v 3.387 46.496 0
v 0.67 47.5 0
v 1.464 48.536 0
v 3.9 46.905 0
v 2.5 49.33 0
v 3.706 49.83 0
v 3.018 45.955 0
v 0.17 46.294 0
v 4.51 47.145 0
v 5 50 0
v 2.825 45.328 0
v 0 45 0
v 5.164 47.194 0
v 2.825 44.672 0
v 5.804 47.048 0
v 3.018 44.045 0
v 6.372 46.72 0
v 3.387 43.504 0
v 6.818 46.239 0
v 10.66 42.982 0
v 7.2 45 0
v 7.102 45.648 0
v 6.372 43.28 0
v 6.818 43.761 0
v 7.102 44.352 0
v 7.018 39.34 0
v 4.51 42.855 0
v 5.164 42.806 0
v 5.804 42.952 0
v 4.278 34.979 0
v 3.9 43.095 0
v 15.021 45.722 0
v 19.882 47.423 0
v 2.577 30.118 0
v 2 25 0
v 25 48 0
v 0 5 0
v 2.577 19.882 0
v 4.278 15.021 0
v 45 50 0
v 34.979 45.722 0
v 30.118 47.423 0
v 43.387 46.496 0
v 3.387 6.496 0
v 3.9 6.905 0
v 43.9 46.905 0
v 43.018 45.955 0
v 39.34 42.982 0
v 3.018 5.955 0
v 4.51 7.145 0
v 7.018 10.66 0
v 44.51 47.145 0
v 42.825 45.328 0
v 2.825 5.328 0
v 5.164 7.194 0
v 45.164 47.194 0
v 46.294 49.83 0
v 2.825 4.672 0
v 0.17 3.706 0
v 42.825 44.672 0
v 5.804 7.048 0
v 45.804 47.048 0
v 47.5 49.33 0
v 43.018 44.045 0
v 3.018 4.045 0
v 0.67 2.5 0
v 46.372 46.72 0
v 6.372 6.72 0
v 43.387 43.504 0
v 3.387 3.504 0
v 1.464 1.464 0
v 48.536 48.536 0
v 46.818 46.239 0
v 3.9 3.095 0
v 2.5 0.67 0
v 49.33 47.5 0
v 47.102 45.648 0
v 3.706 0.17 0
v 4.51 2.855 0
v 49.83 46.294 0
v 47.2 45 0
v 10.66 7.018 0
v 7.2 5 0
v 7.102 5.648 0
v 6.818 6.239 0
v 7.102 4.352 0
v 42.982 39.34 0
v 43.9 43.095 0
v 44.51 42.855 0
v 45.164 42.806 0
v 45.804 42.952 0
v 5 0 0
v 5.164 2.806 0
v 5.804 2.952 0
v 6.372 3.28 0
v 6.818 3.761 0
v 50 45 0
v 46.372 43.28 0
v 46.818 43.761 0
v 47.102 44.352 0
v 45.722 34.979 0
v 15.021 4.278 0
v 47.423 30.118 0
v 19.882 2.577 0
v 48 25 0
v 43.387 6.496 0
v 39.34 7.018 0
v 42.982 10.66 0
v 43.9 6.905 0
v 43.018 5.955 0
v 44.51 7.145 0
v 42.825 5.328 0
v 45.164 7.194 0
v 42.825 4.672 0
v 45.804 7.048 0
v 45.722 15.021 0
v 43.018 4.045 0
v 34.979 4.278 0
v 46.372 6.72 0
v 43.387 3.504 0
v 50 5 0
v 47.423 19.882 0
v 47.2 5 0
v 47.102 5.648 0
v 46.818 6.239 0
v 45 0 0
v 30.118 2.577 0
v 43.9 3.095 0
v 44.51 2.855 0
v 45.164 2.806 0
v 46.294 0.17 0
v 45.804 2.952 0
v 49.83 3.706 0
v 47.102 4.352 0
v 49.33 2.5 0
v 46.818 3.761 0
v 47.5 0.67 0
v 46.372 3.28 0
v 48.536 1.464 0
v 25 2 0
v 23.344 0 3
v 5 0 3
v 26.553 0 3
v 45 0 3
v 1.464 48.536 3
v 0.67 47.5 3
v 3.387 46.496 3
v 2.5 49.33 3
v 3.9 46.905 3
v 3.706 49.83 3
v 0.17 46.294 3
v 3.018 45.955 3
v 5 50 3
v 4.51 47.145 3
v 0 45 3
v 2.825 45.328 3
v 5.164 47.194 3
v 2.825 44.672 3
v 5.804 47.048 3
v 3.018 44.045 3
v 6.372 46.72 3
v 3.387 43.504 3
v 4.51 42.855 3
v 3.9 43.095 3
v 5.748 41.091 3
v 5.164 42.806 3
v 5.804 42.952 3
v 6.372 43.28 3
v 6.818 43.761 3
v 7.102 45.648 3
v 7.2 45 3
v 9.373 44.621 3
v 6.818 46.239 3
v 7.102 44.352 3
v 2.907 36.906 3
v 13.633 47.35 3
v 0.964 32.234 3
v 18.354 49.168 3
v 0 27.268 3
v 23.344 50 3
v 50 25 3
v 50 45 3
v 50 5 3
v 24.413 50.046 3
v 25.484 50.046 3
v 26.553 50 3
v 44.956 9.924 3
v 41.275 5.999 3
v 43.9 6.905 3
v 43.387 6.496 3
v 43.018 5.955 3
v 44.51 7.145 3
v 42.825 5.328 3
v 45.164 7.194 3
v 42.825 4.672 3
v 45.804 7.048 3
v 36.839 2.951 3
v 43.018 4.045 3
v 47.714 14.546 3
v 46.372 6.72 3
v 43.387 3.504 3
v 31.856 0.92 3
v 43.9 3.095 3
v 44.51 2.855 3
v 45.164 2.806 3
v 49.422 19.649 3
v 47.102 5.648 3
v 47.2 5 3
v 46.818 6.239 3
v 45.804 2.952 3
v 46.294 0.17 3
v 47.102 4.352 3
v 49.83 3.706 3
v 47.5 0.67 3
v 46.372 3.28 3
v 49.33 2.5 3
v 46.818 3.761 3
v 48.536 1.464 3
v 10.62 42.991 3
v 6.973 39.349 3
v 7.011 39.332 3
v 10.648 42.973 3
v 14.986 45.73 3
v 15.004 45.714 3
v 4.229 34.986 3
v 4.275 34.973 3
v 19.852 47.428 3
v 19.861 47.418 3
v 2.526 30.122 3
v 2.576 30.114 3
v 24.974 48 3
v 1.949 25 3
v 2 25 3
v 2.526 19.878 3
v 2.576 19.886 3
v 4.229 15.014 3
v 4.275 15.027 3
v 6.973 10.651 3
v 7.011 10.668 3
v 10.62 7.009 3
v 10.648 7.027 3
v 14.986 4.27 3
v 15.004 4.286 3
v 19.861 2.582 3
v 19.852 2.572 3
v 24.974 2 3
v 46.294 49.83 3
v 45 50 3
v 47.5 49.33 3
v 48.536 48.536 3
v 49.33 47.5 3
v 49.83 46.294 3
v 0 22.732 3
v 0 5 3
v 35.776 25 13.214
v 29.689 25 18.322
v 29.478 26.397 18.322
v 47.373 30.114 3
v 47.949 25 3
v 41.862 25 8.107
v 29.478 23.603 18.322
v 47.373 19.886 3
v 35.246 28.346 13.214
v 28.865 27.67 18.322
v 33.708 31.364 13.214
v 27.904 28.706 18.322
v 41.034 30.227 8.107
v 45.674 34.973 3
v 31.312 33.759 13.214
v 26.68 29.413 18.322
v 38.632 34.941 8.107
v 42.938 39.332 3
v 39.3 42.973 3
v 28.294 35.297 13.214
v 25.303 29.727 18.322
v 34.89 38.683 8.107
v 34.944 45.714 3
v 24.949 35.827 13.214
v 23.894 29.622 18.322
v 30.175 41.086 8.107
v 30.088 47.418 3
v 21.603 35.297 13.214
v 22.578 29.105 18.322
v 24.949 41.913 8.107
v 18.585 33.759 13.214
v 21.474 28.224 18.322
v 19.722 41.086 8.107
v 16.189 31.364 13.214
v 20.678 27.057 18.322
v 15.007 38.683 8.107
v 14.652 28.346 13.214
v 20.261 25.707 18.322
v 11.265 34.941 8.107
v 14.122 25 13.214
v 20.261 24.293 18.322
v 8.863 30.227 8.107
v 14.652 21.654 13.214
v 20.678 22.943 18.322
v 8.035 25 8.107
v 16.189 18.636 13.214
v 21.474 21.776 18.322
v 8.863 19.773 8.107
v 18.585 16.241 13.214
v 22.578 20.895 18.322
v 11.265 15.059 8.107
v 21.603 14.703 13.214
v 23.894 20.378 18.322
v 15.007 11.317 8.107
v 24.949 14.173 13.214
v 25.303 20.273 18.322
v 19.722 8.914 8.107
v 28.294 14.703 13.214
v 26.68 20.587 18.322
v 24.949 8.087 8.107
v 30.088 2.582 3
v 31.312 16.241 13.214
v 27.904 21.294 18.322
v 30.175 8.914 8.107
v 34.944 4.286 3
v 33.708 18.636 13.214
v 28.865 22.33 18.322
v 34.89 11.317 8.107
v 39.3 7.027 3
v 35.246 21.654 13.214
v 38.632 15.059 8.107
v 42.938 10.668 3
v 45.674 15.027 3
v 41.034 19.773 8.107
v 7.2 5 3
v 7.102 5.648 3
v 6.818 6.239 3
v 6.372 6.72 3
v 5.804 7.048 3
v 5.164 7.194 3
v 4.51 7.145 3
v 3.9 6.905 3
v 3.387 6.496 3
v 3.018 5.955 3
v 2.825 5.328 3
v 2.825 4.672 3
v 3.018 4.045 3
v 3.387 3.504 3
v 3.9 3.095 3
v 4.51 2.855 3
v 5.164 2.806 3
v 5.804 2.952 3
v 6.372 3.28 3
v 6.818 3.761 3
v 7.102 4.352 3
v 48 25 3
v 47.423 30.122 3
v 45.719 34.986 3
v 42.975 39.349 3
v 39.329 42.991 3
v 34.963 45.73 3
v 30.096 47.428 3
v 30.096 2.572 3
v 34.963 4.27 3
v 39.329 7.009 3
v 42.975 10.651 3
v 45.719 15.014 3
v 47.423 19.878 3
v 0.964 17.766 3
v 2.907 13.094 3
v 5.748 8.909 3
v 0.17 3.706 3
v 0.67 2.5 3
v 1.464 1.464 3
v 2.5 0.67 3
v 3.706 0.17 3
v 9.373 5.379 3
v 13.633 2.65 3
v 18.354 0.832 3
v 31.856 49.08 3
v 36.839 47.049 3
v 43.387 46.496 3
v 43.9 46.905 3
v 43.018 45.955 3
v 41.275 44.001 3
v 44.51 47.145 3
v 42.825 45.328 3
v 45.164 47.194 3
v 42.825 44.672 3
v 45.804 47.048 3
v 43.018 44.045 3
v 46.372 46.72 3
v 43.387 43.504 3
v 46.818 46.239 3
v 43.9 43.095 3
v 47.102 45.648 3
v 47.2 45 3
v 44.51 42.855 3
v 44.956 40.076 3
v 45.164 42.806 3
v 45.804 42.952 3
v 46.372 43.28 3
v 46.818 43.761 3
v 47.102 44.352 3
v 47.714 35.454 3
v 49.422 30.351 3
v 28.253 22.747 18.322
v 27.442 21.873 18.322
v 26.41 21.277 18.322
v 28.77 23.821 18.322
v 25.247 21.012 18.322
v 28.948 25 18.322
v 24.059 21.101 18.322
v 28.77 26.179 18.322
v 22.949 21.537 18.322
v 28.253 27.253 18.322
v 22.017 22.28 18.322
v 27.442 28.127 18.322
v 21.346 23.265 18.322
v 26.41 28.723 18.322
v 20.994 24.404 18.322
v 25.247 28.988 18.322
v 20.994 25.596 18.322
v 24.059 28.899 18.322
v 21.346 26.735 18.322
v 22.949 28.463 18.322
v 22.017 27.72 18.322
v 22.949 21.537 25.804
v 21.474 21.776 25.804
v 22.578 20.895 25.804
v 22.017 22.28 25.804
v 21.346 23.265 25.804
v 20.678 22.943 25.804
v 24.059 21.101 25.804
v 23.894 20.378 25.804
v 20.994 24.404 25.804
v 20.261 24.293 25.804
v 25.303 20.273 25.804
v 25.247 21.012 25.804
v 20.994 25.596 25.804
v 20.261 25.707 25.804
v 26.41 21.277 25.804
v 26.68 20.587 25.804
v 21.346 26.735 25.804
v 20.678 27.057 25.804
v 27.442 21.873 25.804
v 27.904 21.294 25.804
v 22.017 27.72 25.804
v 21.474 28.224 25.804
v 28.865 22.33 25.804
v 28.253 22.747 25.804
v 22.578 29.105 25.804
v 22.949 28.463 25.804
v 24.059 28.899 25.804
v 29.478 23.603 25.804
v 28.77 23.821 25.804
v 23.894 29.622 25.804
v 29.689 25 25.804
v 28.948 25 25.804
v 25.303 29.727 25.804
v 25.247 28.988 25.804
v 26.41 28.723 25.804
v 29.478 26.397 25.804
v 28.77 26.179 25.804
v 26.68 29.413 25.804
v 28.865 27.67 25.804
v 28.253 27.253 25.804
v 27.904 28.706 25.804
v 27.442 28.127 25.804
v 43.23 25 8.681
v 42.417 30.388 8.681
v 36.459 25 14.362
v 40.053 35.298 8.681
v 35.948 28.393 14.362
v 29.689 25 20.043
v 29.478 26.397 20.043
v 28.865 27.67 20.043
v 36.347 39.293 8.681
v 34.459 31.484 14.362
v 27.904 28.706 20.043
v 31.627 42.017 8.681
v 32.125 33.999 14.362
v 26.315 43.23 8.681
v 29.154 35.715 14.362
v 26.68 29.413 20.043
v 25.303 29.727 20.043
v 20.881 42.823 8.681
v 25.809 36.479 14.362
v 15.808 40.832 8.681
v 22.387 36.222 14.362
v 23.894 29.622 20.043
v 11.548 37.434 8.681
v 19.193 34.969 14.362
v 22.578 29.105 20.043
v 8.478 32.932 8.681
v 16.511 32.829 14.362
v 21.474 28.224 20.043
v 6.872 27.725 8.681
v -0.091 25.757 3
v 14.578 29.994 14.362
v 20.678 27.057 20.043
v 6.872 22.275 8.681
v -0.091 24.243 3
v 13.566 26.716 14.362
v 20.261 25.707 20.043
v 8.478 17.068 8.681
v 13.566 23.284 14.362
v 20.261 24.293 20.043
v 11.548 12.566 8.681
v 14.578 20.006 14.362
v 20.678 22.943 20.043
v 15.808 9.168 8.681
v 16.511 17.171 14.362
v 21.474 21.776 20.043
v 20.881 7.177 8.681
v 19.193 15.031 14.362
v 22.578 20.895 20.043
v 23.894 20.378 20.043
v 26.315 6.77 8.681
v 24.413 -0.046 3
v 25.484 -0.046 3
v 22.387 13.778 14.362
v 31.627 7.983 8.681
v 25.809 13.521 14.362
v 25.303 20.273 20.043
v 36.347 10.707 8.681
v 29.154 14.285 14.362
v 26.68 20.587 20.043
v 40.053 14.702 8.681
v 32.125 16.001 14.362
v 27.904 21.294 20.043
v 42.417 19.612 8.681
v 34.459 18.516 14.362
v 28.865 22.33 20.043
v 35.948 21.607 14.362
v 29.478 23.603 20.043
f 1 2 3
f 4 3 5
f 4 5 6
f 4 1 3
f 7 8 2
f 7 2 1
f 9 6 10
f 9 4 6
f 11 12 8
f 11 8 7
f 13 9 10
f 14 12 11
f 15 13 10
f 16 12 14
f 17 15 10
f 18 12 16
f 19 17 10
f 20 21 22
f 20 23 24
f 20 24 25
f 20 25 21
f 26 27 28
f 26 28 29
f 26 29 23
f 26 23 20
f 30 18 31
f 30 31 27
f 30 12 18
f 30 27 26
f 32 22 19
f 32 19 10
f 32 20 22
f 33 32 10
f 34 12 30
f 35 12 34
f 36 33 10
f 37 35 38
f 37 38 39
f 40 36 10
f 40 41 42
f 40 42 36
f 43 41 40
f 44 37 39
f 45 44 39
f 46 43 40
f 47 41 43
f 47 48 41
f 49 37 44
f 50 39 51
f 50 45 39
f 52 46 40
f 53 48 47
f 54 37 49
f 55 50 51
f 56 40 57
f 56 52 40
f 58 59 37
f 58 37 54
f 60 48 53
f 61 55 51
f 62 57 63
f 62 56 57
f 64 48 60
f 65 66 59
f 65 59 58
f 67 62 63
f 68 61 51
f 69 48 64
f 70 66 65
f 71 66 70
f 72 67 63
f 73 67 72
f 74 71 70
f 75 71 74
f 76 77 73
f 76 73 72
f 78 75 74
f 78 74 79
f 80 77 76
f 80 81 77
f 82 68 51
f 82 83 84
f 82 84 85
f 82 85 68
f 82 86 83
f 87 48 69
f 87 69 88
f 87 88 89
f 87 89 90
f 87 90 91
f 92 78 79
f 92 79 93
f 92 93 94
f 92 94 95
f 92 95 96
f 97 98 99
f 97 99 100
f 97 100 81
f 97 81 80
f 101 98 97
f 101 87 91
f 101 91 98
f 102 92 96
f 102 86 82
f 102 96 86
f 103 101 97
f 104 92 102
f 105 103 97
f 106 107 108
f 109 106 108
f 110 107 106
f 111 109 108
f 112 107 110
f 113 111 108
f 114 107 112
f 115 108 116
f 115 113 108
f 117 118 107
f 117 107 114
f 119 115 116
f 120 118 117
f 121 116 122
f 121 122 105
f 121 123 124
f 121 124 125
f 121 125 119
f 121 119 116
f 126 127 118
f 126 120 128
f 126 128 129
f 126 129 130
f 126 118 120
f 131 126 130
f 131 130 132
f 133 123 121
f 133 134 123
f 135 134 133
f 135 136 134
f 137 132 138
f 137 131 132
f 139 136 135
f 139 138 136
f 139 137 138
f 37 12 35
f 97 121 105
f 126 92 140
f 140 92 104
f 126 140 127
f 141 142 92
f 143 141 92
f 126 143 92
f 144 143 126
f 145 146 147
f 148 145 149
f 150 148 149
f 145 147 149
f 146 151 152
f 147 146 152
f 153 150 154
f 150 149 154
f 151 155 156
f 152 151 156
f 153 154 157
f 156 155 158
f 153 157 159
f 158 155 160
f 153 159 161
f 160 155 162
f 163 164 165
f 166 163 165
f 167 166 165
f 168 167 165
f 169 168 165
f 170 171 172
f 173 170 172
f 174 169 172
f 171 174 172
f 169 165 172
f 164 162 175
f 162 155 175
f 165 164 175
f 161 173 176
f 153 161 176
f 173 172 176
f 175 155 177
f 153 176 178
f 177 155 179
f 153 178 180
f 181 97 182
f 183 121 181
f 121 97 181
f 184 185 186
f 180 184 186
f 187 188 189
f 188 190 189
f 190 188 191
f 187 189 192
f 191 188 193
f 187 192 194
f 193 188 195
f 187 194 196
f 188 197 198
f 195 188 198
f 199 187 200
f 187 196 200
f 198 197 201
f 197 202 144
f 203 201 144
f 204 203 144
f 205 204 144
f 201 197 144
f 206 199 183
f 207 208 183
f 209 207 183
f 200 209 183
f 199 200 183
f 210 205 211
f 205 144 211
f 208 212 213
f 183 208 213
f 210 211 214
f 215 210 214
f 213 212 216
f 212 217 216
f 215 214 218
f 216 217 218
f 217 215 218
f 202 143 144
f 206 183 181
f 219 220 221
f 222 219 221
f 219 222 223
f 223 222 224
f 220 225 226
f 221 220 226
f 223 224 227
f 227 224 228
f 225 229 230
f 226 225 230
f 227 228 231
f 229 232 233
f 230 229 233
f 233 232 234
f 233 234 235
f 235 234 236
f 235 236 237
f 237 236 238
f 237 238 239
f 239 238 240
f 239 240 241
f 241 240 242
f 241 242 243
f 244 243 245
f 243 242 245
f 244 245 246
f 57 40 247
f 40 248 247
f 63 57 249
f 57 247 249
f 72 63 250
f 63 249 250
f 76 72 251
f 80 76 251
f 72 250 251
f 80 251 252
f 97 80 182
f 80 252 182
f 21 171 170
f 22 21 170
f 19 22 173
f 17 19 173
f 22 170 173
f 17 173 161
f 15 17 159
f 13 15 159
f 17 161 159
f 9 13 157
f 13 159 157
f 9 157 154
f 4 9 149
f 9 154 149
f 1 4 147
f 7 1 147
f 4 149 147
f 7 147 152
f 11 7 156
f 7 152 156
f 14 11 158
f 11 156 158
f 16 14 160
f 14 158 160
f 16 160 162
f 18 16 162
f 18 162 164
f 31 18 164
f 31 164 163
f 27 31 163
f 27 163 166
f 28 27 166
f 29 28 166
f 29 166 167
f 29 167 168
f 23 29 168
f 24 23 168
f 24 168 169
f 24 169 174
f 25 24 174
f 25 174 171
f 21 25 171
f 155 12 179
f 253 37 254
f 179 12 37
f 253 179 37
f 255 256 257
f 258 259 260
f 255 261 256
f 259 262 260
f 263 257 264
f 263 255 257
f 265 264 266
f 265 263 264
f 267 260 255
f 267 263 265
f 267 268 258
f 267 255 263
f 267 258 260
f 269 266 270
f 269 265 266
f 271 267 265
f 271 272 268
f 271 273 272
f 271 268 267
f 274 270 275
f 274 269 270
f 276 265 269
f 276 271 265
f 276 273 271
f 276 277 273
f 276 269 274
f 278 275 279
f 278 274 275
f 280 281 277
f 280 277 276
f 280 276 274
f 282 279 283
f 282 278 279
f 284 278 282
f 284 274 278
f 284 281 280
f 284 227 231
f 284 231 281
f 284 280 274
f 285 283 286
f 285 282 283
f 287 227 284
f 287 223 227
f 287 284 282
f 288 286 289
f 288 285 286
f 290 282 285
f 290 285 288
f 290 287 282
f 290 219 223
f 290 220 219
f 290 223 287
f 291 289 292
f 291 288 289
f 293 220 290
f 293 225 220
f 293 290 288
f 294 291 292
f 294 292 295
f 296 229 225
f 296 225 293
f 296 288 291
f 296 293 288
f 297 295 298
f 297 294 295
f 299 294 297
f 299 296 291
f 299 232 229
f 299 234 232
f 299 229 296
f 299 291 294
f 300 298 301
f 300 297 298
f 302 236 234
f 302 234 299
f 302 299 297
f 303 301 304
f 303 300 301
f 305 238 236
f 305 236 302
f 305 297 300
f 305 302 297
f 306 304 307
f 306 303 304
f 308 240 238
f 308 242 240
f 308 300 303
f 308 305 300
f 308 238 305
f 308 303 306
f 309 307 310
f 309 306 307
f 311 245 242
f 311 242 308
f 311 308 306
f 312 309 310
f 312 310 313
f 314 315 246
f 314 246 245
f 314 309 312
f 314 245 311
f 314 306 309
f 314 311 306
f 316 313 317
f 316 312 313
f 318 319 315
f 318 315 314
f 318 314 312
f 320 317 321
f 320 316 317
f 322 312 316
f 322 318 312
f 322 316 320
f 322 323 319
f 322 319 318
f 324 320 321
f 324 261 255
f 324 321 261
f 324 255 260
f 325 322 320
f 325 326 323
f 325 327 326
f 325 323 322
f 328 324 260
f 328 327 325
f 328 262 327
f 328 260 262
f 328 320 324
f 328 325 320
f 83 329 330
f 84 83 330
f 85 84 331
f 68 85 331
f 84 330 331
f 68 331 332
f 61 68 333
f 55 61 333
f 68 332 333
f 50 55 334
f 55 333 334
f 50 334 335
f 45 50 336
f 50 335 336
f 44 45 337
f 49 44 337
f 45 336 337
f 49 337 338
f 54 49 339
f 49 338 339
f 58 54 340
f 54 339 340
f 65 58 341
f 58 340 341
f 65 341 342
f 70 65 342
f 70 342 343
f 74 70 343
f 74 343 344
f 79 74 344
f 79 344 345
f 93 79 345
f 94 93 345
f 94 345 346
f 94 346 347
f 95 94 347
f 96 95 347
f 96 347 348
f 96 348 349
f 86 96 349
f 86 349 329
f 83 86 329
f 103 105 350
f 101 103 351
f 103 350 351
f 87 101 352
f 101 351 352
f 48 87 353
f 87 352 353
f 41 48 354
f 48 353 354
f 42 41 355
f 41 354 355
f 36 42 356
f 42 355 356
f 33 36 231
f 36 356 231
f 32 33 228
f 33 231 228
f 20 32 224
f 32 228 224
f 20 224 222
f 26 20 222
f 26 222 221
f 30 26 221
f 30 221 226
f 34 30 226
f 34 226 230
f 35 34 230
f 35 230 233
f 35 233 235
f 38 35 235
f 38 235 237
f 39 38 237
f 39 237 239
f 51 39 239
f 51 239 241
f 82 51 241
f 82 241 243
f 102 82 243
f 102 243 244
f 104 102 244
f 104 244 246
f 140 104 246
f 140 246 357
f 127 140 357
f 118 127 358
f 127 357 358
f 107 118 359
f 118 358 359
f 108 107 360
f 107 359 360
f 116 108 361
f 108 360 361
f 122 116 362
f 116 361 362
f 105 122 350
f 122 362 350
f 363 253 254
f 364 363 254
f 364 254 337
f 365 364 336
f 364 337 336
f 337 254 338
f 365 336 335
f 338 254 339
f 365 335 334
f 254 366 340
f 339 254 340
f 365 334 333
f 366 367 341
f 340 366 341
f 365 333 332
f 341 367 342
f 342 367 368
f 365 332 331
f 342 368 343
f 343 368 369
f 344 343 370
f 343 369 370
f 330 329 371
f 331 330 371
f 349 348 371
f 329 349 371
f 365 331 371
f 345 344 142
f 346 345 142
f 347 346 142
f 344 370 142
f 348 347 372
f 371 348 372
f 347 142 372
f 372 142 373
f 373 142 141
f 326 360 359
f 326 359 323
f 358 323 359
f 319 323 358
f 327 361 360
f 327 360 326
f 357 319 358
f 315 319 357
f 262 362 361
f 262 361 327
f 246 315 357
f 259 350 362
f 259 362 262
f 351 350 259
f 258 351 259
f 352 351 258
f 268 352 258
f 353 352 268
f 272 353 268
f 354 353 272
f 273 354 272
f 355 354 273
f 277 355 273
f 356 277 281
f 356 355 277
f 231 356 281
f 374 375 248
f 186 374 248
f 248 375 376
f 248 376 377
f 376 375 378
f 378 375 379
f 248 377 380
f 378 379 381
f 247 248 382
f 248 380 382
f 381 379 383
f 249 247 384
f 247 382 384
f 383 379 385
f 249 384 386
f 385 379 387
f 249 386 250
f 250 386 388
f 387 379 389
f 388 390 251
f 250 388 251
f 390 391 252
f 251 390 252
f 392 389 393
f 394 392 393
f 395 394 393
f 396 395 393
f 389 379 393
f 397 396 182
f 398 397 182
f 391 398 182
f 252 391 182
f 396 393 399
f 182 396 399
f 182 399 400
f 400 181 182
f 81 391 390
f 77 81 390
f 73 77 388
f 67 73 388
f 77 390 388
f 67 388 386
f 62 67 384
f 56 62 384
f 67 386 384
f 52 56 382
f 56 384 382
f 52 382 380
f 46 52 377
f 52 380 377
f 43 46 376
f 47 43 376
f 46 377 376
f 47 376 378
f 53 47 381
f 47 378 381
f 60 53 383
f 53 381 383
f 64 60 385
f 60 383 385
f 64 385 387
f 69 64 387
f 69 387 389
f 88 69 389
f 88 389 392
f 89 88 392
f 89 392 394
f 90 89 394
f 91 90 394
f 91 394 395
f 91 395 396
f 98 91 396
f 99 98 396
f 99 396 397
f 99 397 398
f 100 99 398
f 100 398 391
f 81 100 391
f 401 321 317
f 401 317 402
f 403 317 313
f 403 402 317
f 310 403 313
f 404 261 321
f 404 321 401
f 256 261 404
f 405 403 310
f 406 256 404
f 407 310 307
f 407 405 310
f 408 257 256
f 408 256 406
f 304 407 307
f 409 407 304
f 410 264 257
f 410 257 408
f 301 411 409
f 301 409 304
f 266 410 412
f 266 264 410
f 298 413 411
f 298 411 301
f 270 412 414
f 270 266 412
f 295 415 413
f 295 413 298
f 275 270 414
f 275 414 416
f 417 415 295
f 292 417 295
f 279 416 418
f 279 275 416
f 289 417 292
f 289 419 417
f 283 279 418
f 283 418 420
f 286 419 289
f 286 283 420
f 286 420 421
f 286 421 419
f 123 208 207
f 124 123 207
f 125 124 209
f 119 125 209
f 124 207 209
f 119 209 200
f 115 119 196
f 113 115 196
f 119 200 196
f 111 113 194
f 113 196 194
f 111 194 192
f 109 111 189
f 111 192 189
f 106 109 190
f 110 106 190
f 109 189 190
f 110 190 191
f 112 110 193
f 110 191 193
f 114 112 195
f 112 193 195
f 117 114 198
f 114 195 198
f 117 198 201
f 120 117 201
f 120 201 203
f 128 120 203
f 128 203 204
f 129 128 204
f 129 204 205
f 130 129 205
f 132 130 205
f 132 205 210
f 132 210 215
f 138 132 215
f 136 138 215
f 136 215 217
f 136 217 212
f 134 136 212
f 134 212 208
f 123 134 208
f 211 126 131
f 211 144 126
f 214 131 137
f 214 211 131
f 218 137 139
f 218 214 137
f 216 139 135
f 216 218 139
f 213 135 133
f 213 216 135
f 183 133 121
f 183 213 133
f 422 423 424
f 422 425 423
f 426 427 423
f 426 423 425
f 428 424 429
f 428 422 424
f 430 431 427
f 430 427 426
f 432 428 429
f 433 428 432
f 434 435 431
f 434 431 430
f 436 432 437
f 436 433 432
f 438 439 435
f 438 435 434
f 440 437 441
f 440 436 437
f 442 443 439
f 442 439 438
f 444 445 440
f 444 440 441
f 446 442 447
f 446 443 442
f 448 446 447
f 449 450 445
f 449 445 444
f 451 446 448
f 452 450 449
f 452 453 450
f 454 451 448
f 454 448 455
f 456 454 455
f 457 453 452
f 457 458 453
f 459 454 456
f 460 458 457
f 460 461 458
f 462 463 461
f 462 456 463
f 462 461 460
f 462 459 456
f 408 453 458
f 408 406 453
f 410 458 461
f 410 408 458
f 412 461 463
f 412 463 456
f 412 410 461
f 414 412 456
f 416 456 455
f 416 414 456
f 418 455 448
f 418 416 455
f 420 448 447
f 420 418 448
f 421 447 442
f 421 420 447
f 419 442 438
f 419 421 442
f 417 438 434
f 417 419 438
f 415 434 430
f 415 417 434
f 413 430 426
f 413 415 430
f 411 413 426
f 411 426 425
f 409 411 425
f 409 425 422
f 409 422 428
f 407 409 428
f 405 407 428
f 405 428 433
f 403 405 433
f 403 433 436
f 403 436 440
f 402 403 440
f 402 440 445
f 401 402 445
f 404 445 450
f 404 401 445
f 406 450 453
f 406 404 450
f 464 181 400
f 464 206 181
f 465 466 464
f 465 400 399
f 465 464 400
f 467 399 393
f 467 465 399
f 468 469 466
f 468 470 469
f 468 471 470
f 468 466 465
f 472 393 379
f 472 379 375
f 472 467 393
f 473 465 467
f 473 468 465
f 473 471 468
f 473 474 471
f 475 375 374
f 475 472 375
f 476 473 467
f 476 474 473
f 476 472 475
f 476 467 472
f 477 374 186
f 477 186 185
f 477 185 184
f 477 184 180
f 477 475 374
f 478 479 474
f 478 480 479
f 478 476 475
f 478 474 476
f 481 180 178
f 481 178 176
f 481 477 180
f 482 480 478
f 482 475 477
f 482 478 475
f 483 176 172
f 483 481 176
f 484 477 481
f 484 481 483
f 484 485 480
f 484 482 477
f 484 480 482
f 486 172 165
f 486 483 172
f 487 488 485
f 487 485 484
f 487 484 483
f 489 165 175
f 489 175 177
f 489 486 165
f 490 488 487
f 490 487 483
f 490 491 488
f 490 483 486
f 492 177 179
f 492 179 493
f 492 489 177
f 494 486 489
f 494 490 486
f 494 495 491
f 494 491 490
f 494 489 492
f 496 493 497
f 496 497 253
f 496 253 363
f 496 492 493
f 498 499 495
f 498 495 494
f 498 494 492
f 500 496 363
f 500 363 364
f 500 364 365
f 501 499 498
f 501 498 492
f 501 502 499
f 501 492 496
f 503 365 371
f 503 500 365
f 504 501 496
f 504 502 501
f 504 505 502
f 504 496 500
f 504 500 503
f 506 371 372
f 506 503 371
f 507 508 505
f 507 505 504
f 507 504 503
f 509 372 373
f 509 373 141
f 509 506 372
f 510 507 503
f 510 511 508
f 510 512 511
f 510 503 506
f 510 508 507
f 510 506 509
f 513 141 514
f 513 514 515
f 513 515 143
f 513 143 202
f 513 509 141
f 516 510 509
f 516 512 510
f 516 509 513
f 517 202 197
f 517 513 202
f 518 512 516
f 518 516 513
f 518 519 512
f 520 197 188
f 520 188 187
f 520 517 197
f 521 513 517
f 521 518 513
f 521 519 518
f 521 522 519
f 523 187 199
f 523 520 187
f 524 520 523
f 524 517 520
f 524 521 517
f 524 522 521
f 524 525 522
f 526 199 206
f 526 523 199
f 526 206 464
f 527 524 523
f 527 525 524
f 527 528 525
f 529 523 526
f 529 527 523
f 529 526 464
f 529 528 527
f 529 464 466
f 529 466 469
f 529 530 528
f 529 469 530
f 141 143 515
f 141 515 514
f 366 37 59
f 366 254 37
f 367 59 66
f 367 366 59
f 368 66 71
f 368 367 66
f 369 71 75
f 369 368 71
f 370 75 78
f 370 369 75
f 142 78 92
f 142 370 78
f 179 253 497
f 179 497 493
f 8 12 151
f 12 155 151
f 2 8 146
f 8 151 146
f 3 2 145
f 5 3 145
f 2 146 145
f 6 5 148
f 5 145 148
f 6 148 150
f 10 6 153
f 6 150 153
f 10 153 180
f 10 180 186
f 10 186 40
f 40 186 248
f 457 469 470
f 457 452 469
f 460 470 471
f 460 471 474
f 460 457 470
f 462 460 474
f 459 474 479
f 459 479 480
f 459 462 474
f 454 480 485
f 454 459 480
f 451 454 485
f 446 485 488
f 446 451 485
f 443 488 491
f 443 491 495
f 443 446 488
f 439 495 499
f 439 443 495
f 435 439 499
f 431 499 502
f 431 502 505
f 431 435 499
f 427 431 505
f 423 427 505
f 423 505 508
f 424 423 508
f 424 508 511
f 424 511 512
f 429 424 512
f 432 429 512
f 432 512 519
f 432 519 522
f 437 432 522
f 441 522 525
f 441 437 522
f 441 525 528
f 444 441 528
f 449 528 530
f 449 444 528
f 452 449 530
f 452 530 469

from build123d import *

# Parameters (mm, degrees)
F0_W     = 50
F0_H     = 3
F1_DEPTH = 50
F2_R     = 23
F3_DEPTH = 25
F7_R     = 2.2
F8_DEPTH = 25
F9_R     = 5


with BuildPart() as f1:
    # F0 (on Front) → F1 (new body)
    with BuildSketch(Plane.XZ):
        with Locations((25, 1.5)):
            Rectangle(F0_W, F0_H)
    extrude(amount=-F1_DEPTH)

    # F2 (on face) → F3 (cut)
    with BuildSketch(Plane.XY.offset(3)):
        with Locations((25, 25)):
            Circle(F2_R)
    extrude(amount=-F3_DEPTH, mode=Mode.SUBTRACT)

    # F5 (on offset) → F6 (revolve)
    with BuildSketch(Plane.XZ.offset(-25)):
        Polygon((29.689003, 18.321594), (47.948567, 3), (50, 3), (29.689003, 20.04295), (29.689003, 25.803645), (28.947536, 25.803645), (28.947536, 18.321594), align=None)
    revolve(axis=Axis((24.948567, 25, 14.356404), (0, 0, 1)))

    # F7 (on face) → F8 (cut)
    with BuildSketch(Plane.XY.offset(3)):
        with Locations((45, 45)):
            Circle(F7_R)
        with Locations((45, 5)):
            Circle(F7_R)
        with Locations((5, 5)):
            Circle(F7_R)
        with Locations((5, 45)):
            Circle(F7_R)
    extrude(amount=-F8_DEPTH, mode=Mode.SUBTRACT)

    # F9
    f9_edges = [f1.edges().sort_by_distance(p)[0] for p in [
        (0, 0, 1.5),
        (50, 0, 1.5),
        (50, 50, 1.5),
        (0, 50, 1.5),
    ]]
    fillet(f9_edges, radius=F9_R)


solid = f1.part
